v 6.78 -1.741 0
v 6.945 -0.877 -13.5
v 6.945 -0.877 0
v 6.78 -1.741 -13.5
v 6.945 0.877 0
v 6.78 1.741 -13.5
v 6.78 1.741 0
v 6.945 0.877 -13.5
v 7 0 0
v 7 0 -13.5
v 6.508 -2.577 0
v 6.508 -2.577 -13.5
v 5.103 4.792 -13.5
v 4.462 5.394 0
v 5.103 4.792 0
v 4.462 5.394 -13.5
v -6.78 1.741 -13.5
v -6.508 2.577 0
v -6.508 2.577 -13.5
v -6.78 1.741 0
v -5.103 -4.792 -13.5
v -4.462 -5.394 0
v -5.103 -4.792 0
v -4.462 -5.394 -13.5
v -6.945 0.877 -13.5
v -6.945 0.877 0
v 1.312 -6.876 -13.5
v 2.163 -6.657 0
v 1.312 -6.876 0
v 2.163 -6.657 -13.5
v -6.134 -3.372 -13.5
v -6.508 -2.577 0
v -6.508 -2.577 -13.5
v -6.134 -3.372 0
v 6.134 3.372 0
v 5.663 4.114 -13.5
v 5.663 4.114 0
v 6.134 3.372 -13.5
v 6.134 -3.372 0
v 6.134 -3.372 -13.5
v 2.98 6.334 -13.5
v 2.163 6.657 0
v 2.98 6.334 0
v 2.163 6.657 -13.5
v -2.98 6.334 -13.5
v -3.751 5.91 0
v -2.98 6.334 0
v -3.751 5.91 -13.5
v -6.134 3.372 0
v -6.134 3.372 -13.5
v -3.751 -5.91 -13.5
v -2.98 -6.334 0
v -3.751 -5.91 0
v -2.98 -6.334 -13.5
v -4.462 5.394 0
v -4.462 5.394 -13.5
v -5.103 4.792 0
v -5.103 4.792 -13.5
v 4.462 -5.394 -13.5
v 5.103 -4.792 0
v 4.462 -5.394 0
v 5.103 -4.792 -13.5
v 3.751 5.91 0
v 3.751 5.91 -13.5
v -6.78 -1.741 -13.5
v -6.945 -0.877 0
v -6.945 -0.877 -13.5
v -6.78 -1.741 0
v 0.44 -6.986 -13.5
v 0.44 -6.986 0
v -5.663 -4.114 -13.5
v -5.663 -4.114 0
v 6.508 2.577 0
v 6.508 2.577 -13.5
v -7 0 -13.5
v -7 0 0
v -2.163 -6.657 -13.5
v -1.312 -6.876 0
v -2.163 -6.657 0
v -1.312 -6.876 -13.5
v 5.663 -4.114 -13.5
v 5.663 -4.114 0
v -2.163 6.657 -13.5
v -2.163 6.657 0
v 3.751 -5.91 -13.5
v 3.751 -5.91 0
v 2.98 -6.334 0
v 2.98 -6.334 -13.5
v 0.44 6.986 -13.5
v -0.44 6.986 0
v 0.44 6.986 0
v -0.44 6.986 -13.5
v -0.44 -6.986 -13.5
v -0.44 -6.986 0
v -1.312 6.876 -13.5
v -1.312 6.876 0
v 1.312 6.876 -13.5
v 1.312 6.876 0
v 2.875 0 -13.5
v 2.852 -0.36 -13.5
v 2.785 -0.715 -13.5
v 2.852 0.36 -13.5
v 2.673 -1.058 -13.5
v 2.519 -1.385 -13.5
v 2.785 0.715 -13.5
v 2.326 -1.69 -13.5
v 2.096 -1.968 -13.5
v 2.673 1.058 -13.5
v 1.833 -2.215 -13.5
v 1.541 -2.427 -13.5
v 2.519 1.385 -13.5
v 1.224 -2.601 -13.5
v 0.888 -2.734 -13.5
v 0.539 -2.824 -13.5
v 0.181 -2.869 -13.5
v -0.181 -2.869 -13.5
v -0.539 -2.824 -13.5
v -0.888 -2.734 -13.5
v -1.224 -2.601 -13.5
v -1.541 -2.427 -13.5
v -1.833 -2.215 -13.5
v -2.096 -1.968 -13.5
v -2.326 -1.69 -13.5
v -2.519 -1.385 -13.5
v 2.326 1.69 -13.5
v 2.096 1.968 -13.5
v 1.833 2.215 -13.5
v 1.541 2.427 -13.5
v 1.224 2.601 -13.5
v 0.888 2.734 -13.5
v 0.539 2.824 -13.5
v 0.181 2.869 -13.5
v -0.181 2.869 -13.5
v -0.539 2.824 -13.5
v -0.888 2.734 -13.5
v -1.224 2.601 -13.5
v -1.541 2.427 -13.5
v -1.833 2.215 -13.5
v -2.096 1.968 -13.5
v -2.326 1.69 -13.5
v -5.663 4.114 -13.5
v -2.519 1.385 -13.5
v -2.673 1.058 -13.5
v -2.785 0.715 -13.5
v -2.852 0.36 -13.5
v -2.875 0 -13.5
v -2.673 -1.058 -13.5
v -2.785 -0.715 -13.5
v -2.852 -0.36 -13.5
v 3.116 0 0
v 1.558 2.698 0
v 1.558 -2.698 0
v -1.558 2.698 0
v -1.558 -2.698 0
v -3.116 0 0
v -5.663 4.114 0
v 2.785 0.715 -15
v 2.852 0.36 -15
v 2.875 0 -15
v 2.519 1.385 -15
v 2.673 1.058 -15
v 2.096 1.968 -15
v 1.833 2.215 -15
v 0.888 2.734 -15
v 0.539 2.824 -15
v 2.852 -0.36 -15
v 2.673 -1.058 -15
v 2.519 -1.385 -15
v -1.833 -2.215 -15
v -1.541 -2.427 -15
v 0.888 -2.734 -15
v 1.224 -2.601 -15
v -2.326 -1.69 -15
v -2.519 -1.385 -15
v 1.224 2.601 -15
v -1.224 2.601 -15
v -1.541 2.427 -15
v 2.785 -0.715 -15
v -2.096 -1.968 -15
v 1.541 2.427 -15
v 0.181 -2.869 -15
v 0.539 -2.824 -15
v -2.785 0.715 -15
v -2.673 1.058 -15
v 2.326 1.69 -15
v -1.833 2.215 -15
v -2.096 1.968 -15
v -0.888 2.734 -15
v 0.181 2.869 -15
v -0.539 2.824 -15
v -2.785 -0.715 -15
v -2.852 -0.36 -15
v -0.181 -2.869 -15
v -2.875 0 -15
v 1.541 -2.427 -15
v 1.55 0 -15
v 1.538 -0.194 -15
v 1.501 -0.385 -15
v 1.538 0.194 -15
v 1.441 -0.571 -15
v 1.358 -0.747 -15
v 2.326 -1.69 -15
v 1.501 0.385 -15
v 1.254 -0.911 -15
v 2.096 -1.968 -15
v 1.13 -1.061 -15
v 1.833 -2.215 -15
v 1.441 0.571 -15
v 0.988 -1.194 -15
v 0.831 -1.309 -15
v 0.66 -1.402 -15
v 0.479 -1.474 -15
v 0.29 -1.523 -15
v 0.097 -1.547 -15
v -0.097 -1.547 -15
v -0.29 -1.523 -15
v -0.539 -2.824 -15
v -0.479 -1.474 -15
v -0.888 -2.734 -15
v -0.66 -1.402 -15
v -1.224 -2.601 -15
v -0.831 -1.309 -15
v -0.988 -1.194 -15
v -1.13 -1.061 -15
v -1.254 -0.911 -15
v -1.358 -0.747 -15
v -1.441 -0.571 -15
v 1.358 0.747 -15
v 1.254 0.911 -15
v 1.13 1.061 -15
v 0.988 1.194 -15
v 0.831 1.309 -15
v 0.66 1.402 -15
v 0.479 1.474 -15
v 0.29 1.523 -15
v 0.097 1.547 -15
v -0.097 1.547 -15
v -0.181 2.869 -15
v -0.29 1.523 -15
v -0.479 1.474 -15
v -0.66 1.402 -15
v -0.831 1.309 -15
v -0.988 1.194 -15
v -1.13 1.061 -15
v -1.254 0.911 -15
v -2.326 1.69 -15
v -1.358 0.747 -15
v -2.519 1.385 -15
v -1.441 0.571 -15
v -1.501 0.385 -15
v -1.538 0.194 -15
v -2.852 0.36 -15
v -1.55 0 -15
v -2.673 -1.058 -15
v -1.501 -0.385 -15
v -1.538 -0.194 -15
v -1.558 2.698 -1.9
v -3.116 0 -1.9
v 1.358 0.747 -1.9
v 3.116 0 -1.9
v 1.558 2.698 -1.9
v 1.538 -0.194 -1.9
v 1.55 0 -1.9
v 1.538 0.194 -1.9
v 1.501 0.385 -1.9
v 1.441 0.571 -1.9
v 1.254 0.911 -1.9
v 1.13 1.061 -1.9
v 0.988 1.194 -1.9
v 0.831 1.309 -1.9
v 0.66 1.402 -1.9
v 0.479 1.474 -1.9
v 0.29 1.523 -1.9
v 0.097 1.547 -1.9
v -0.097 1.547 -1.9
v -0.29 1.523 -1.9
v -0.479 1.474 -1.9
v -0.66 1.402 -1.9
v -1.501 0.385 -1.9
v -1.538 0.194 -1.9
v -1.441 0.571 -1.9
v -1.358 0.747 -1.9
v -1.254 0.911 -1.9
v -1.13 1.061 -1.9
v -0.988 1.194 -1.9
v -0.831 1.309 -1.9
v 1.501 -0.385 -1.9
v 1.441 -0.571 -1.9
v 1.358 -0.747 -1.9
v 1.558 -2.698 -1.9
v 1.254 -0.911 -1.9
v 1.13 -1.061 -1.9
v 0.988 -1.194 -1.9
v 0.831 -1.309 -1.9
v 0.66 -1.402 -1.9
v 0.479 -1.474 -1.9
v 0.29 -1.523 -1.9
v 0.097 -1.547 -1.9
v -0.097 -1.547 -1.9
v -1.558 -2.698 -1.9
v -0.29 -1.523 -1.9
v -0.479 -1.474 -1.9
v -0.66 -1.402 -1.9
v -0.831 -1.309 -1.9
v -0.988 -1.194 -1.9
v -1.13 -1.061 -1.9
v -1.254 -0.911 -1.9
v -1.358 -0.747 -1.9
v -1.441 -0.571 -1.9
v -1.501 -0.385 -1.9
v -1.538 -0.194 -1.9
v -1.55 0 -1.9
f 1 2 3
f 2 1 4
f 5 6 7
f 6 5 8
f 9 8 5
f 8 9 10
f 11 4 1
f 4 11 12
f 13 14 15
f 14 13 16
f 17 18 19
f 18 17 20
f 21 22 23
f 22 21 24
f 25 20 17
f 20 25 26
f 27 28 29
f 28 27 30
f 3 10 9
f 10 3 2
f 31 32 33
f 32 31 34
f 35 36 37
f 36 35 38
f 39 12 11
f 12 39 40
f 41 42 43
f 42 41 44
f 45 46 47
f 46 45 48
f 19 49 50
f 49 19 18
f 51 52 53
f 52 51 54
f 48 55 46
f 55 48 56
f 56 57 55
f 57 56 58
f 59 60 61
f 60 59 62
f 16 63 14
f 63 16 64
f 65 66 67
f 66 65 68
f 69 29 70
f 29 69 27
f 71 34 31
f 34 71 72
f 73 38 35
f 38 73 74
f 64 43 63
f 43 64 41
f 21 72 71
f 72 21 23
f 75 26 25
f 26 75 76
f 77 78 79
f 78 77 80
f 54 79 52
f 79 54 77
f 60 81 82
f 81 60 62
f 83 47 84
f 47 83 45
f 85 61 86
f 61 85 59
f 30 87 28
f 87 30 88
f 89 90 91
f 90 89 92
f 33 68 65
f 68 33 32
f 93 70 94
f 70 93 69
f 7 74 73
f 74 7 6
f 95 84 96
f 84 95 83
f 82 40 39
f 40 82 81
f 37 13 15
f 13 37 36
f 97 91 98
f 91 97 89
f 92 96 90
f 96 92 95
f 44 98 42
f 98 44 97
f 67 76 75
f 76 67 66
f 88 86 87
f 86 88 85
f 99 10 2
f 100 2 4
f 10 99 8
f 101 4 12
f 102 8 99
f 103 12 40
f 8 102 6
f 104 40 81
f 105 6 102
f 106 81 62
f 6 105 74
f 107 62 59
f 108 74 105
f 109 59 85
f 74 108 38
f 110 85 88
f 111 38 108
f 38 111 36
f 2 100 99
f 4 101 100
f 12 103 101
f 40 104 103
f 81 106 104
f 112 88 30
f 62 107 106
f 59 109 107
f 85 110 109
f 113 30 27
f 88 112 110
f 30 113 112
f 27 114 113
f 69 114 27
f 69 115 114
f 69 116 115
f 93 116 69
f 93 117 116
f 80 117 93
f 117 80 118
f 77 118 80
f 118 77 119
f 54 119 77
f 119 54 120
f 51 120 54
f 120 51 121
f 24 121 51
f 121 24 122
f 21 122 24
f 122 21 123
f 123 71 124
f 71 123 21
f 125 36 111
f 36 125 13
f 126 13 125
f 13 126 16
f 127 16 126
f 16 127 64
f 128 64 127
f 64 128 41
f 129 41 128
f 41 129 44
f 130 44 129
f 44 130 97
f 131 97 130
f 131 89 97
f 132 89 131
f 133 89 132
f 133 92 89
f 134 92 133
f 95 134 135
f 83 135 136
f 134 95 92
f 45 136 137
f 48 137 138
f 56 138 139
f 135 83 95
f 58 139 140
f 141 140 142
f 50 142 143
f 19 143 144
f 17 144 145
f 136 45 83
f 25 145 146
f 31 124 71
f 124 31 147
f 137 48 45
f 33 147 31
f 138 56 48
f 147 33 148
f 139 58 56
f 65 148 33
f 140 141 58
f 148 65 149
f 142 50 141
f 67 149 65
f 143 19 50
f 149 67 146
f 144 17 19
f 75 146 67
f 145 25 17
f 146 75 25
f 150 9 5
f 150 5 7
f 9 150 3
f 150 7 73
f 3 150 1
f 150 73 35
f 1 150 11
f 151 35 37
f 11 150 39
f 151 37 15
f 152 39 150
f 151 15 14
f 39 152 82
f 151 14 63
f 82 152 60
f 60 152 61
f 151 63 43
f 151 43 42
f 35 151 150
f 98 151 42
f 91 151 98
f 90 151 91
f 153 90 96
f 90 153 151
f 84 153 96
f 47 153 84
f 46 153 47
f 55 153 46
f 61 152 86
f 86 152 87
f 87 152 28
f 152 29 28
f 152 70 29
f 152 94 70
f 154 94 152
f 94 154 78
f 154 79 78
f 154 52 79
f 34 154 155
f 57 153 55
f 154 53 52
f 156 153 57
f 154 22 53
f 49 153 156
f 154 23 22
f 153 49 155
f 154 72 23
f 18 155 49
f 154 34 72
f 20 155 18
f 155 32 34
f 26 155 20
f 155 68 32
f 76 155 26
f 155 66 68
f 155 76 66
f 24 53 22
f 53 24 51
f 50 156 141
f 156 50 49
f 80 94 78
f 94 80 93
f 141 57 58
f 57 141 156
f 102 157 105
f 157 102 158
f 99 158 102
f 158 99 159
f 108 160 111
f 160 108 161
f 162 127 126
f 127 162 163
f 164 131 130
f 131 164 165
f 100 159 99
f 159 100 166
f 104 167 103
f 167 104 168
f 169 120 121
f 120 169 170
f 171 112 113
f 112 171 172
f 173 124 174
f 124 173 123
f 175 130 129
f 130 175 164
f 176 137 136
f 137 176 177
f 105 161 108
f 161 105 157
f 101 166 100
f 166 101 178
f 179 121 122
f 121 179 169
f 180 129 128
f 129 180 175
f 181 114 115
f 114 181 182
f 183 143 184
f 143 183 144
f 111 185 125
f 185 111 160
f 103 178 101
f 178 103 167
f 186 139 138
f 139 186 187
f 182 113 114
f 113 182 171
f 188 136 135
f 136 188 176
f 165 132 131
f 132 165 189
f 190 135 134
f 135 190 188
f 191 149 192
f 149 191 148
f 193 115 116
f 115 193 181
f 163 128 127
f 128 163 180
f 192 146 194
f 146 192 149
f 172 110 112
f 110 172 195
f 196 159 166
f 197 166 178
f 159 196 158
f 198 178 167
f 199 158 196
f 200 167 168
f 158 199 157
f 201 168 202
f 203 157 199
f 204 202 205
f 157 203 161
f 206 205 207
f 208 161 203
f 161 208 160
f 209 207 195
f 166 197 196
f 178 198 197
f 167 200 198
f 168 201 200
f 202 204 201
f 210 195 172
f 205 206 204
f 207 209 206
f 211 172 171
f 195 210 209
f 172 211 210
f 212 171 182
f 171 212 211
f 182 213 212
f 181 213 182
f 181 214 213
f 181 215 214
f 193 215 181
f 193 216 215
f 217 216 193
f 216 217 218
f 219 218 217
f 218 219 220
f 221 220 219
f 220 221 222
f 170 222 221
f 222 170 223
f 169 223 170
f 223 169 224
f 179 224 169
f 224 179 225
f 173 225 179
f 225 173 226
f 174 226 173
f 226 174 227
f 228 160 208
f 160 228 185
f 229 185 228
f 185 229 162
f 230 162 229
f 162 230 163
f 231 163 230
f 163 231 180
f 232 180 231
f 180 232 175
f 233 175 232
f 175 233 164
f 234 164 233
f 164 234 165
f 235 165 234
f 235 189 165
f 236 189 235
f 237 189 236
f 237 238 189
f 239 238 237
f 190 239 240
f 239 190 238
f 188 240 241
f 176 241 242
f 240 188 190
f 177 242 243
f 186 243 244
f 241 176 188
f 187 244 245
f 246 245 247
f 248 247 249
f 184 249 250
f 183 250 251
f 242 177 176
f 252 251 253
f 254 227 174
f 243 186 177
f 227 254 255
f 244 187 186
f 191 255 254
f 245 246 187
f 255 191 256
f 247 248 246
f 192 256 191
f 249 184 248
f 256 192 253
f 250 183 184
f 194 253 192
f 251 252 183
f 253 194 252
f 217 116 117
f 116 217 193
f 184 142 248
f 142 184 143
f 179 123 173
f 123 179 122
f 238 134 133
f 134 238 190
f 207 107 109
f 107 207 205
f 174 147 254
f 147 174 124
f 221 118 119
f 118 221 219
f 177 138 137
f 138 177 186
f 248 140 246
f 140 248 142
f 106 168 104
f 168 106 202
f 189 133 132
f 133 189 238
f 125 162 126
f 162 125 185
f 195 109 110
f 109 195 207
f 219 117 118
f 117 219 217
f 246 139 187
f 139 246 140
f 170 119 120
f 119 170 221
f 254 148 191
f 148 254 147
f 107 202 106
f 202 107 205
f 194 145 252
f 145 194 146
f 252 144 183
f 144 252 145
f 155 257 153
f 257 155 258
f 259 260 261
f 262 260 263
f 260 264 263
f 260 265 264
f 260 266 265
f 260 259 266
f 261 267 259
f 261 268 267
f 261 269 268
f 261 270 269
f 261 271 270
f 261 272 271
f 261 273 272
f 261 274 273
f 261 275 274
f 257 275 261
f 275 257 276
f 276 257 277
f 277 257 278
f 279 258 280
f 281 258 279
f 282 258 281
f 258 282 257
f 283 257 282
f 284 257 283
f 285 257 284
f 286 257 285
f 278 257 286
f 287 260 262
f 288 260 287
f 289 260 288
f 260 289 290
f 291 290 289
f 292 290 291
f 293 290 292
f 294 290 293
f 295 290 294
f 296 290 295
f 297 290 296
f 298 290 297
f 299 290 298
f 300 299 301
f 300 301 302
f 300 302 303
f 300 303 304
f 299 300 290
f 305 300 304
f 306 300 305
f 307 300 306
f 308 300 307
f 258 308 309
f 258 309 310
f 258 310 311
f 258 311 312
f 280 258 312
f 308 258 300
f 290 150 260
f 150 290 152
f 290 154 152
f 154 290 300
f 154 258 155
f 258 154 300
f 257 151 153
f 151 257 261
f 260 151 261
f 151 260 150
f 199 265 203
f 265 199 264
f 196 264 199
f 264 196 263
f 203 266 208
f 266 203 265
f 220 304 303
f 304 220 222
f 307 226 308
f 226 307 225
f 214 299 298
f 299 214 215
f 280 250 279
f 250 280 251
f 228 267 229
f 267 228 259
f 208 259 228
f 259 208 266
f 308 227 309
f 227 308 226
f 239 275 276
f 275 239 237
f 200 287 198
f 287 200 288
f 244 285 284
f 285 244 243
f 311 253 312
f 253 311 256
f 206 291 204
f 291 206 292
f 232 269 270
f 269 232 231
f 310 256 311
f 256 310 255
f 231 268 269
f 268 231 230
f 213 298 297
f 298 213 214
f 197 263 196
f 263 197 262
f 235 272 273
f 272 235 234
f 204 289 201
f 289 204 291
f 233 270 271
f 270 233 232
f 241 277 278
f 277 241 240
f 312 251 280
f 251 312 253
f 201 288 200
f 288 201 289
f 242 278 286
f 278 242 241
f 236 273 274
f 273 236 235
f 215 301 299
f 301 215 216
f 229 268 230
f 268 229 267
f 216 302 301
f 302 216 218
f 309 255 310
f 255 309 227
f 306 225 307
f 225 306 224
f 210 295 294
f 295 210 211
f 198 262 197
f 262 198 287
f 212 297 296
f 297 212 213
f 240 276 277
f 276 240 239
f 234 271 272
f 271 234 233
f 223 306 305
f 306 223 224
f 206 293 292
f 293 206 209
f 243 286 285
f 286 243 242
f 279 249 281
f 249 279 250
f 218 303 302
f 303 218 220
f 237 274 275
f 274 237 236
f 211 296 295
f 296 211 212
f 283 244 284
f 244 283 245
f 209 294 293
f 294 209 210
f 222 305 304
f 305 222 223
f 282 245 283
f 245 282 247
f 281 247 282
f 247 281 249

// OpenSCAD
$fn = 50;


difference() {
	union() {
		translate(v = [0, 0, -13.5000000000]) {
			cylinder(h = 13.5000000000, r = 7.0000000000);
		}
		#translate(v = [0, 0, -15.0000000000]) {
			cylinder(h = 15, r = 2.8750000000);
		}
	}
	union() {
		translate(v = [0, 0, 0]) {
			rotate(a = [0, 0, 0]) {
				difference() {
					union() {
						translate(v = [0, 0, -1.9000000000]) {
							linear_extrude(height = 1.9000000000) {
								polygon(points = [[3.1158000000, 0.0000000000], [1.5579000000, 2.6983619531], [-1.5579000000, 2.6983619531], [-3.1158000000, 0.0000000000], [-1.5579000000, -2.6983619531], [1.5579000000, -2.6983619531]]);
							}
						}
					}
					union();
				}
			}
		}
		#translate(v = [0, 0, -100.0000000000]) {
			cylinder(h = 200, r = 1.5500000000);
		}
	}
}
